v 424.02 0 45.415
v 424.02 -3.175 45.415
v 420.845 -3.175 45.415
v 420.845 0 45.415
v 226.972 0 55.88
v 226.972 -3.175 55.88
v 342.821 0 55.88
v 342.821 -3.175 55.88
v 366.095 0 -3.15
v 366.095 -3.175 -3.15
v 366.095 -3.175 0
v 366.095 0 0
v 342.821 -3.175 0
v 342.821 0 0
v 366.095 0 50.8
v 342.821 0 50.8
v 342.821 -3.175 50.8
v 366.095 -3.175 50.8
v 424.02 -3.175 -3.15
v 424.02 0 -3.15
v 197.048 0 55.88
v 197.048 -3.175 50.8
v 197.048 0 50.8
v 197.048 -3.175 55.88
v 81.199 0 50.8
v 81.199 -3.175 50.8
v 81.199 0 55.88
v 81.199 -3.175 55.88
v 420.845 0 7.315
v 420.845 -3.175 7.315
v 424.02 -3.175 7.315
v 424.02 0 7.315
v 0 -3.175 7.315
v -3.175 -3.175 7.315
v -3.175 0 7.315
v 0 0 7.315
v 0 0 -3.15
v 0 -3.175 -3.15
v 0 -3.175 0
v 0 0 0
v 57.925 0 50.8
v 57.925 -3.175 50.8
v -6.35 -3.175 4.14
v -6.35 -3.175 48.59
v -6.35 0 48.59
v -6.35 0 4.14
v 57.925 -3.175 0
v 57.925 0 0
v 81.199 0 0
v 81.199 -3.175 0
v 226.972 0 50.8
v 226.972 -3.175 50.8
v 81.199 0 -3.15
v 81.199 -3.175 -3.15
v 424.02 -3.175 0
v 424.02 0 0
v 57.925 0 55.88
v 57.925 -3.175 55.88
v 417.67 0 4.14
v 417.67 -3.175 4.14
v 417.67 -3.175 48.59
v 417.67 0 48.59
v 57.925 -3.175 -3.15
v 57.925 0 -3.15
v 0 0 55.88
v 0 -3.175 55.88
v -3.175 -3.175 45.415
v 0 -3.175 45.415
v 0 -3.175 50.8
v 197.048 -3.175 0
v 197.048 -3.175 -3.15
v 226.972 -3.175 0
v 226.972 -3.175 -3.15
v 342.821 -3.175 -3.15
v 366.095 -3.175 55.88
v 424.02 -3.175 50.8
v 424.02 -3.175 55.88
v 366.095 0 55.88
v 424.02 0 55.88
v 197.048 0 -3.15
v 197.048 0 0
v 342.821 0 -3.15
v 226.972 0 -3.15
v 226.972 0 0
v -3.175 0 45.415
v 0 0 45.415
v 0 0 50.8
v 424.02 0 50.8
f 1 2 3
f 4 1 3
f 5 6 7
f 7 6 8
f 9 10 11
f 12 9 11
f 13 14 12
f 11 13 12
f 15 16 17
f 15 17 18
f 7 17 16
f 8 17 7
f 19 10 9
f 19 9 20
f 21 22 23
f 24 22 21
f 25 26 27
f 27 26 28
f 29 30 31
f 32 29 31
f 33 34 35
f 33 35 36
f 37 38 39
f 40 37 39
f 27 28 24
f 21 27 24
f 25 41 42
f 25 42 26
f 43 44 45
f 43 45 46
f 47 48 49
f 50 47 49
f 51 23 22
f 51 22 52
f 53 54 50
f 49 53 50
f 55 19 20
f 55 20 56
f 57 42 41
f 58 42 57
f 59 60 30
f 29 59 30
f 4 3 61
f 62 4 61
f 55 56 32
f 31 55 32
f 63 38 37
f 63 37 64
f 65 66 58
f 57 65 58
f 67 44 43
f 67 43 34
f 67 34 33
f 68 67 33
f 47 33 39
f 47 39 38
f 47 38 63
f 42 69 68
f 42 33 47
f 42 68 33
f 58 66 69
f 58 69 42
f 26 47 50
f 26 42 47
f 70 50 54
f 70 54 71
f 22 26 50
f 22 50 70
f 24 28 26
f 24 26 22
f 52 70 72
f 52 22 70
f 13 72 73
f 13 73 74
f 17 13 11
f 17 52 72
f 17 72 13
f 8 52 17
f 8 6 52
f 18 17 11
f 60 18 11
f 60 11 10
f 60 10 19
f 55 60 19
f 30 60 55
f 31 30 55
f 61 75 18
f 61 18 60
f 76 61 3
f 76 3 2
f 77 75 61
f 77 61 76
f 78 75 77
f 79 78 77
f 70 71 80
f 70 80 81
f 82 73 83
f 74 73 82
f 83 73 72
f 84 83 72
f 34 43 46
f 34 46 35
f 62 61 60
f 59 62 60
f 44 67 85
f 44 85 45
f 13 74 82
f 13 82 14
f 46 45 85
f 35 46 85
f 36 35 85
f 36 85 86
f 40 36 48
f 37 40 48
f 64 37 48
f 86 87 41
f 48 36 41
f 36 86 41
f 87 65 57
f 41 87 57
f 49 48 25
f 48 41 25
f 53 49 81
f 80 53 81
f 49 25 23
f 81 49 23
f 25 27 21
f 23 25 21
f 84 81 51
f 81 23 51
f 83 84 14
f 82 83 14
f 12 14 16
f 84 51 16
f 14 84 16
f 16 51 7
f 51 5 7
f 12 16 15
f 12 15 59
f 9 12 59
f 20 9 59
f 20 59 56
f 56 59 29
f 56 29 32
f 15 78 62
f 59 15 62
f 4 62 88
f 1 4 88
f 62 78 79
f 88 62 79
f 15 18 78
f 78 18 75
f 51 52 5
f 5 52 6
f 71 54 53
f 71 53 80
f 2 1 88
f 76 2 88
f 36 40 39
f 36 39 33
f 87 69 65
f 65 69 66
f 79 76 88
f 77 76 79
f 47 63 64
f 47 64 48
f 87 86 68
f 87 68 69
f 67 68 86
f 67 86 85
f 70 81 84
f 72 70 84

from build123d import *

# Parameters (mm, degrees)
F0_W     = 424.019751
F0_H     = 50.8
F1_DEPTH = 3.175
F2_W     = 57.9247
F2_H     = 5.08
F2_W_2   = 115.8494
F2_H_2   = 3.1496
F3_DEPTH = 3.175
F5_DEPTH = 3.175
F6_DEPTH = 3.176


with BuildPart() as f1:
    # F0 (on Front) → F1 (new body)
    with BuildSketch(Plane.XZ):
        with Locations((212.009875, 25.4)):
            Rectangle(F0_W, F0_H)
    extrude(amount=F1_DEPTH)

    # F2 (on face) → F3 (join)
    with BuildSketch(Plane.XZ.offset(3.175)):
        with Locations((28.96235, 53.34)):
            Rectangle(F2_W, F2_H)
        with Locations((139.123344, 53.34)):
            Rectangle(F2_W_2, F2_H)
        with Locations((284.896408, 53.34)):
            Rectangle(F2_W_2, F2_H)
        with Locations((395.057401, 53.34)):
            Rectangle(F2_W, F2_H)
        with Locations((28.96235, -1.5748)):
            Rectangle(F2_W, F2_H_2)
        with Locations((139.123344, -1.5748)):
            Rectangle(F2_W_2, F2_H_2)
        with Locations((284.896408, -1.5748)):
            Rectangle(F2_W_2, F2_H_2)
        with Locations((395.057401, -1.5748)):
            Rectangle(F2_W, F2_H_2)
    extrude(amount=-F3_DEPTH)

    # F4 (on face) → F5 (join)
    with BuildSketch(Plane.XZ.offset(3.175)):
        Polygon((0, 7.3152), (0, 45.4152), (-3.175, 45.4152), (-6.35, 48.5902), (-6.35, 4.1402), (-3.175, 7.3152), align=None)
    extrude(amount=-F5_DEPTH)

    # F4 (on face) → F6 (cut, through all)
    with BuildSketch(Plane.XZ.offset(3.175)):
        Polygon((424.019751, 7.3152), (424.019751, 45.4152), (420.844751, 45.4152), (417.669751, 48.5902), (417.669751, 4.1402), (420.844751, 7.3152), align=None)
    extrude(amount=-F6_DEPTH, mode=Mode.SUBTRACT)


solid = f1.part
